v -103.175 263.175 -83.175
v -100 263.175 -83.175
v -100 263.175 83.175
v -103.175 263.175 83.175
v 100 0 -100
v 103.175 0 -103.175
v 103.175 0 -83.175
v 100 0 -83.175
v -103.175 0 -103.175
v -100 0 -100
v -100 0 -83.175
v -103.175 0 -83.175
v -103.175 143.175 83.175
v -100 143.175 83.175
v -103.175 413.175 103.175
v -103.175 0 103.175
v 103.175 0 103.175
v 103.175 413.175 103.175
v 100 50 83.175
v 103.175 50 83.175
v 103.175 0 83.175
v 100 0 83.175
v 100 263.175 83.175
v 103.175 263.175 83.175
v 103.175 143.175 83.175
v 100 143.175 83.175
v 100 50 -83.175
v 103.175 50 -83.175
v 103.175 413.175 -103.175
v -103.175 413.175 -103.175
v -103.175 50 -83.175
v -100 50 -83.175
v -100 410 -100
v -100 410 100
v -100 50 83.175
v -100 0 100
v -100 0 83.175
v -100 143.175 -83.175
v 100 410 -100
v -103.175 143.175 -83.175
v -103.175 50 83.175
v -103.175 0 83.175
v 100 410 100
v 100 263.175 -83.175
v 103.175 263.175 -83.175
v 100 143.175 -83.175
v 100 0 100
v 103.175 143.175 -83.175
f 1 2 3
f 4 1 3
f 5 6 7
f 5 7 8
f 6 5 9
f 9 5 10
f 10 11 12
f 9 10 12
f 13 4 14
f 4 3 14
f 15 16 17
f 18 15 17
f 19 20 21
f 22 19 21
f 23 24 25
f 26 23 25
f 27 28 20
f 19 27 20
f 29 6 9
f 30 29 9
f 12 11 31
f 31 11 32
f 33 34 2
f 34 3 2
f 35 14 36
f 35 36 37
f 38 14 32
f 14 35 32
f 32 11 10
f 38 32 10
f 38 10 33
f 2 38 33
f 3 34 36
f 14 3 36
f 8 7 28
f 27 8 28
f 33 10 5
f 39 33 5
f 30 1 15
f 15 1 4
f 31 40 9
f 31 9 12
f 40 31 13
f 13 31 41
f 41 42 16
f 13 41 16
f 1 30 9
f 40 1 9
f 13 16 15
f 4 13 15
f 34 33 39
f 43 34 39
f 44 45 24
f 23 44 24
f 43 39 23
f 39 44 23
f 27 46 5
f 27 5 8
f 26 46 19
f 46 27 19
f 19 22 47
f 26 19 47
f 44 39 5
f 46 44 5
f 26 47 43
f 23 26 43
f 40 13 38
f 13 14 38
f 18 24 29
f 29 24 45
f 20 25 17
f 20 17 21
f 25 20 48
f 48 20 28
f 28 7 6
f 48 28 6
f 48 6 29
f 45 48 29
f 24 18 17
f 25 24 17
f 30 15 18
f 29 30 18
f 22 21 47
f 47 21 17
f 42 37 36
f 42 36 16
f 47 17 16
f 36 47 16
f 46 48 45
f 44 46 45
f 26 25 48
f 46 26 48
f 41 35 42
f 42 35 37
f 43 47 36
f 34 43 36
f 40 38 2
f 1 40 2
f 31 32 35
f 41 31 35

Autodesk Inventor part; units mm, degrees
ref_plane "YZ Plane" through (0, 0, 0) normal (1, 0, 0) x (0, 1, 0)
ref_plane "XZ Plane" through (0, 0, 0) normal (0, 1, 0) x (-1, 0, 0)
ref_plane "XY Plane" through (0, 0, 0) normal (0, 0, 1) x (1, 0, 0)
sketch "Sketch1" plane through (0, 0, 0) normal (0, 1, 0) x (-1, 0, 0)
  line L0 (-100, 100) -> (100, 100)
  line L1 (100, 100) -> (100, -100)
  line L2 (100, -100) -> (-100, -100)
  line L3 (-100, -100) -> (-100, 100)
  line L4 (-100, 100) -> (100, -100) construction
  line L5 (100, 100) -> (-100, -100) construction
  line L6 (103.175, -103.175) -> (103.175, 103.175)
  line L7 (103.175, 103.175) -> (-103.175, 103.175)
  line L8 (-103.175, 103.175) -> (-103.175, -103.175)
  line L9 (-103.175, -103.175) -> (103.175, -103.175)
  point P0 (0, 0)
  dimension "d0" = 200
  dimension "d1" = 3.175
extrude "Extrusion1" add sketch "Sketch1" along normal blind 410
sketch "Sketch2" plane through (0, 410, 0) normal (0, 1, 0) x (1, 0, 0)
  line L0 (-100, -100) -> (-100, 100) projected
  line L1 (-100, 100) -> (100, 100) projected
  line L2 (100, 100) -> (100, -100) projected
  line L3 (100, -100) -> (-100, -100) projected
  line L4 (-103.175, 103.175) -> (-103.175, -103.175) projected
  line L5 (-103.175, -103.175) -> (103.175, -103.175) projected
  line L6 (103.175, -103.175) -> (103.175, 103.175) projected
  line L7 (103.175, 103.175) -> (-103.175, 103.175) projected
  point P0 (0, 0)
extrude "Extrusion2" add sketch "Sketch2" along normal blind 3.175 contours L0 L1 L2 L3 | L7 L6 L5 L4
sketch "Sketch3" plane through (103.175, 0, 103.175) normal (1, 0, 0) x (0, 0, -1)
  line L0 (0, 0) -> (206.35, 0) projected
  line L1 (206.35, 0) -> (206.35, 413.175) projected
  line L2 (0, 413.175) -> (206.35, 413.175) projected
  line L3 (0, 0) -> (0, 413.175) projected
  line L4 (206.35, 0) -> (0, 0) projected
  line L5 (186.35, 0) -> (186.35, 50)
  line L6 (186.35, 50) -> (20, 50)
  line L7 (20, 50) -> (20, 0)
  line L8 (20, 263.175) -> (20, 143.175)
  line L9 (20, 143.175) -> (186.35, 143.175)
  line L10 (186.35, 143.175) -> (186.35, 263.175)
  line L11 (186.35, 263.175) -> (20, 263.175)
  point P0 (103.175, 0)
  dimension "d6" = 50
  dimension "d7" = 20
  dimension "d8" = 20
  dimension "d9" = 150
  dimension "d12" = 120
extrude "Extrusion3" cut sketch "Sketch3" against normal up to surface (206.35 mm away) contours L7 L6 L5 L0 | L11 L10 L9 L8
properties part number "Cover"
